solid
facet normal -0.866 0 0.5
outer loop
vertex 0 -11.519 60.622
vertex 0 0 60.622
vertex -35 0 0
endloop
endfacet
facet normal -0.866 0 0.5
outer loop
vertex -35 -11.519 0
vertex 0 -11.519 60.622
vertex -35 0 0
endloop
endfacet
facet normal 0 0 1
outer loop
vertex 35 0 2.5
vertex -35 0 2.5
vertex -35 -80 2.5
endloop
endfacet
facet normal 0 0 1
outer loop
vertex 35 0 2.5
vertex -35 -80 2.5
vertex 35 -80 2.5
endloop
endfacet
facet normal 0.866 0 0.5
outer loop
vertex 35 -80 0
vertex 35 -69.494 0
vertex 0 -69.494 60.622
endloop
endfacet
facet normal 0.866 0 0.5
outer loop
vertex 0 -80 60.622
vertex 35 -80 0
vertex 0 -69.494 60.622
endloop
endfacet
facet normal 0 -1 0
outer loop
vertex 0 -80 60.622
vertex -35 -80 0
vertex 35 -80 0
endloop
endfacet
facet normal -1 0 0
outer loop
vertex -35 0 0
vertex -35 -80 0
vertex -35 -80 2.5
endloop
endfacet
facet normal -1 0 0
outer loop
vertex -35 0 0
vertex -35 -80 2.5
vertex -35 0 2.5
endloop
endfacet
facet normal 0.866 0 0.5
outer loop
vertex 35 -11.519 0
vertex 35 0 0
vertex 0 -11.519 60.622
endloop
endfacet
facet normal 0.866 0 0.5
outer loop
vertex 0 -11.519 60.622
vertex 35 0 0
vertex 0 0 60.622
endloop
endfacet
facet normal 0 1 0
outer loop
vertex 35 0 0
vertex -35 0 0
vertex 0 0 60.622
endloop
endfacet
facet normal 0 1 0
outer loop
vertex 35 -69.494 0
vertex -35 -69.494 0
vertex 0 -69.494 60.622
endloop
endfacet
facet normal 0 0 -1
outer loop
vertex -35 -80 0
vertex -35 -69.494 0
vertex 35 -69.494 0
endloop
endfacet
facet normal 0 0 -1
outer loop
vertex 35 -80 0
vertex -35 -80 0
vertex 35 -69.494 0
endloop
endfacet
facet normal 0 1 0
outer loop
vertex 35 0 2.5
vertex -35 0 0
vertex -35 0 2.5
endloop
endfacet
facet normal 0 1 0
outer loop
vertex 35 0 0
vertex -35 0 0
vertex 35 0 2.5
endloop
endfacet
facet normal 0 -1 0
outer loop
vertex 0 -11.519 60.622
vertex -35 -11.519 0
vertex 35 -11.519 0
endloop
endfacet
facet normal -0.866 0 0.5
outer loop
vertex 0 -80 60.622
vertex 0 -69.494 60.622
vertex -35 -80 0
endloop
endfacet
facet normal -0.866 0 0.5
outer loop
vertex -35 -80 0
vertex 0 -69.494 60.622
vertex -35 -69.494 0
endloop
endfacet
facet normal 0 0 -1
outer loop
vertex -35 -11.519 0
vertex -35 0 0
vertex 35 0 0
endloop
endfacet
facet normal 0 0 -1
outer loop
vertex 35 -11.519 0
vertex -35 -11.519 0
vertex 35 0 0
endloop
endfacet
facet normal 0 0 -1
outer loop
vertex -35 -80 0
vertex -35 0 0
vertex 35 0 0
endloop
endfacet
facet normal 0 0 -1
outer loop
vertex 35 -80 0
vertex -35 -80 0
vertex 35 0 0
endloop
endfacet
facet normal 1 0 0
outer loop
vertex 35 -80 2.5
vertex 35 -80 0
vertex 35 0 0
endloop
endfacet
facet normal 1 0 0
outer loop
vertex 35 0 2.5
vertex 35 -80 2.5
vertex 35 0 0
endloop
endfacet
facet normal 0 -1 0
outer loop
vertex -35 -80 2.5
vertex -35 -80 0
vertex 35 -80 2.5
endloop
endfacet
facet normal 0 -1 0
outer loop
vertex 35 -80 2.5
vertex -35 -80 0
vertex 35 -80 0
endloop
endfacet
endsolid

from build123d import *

# Parameters (mm, degrees)
F1_DEPTH = 80
F2_W     = 57.9757587984
F2_H     = 70
F3_DEPTH = 100
F4_W     = 70
F4_H     = 80
F5_DEPTH = 2.5


with BuildPart() as f1:
    # F0 (on Front) → F1 (new body)
    with BuildSketch(Plane.XZ):
        Polygon((35, 0), (0, 60.6217782649), (-35, 0), align=None)
    extrude(amount=F1_DEPTH)

    # F2 (on face) → F3 (cut)
    with BuildSketch(Plane(origin=(-26.25, 0, 15.1554445662), x_dir=(0, -1, 0), z_dir=(-0.8660254038, 0, 0.5))):
        with Locations((40.5064574443, 17.5)):
            Rectangle(F2_W, F2_H)
    extrude(amount=-F3_DEPTH, mode=Mode.SUBTRACT)


with BuildPart() as f5:
    # F4 (on Top) → F5 (new body)
    with BuildSketch(Plane.XY):
        with Locations((0, -40)):
            Rectangle(F4_W, F4_H)
    extrude(amount=F5_DEPTH)


solid = Compound([f1.part, f5.part])
